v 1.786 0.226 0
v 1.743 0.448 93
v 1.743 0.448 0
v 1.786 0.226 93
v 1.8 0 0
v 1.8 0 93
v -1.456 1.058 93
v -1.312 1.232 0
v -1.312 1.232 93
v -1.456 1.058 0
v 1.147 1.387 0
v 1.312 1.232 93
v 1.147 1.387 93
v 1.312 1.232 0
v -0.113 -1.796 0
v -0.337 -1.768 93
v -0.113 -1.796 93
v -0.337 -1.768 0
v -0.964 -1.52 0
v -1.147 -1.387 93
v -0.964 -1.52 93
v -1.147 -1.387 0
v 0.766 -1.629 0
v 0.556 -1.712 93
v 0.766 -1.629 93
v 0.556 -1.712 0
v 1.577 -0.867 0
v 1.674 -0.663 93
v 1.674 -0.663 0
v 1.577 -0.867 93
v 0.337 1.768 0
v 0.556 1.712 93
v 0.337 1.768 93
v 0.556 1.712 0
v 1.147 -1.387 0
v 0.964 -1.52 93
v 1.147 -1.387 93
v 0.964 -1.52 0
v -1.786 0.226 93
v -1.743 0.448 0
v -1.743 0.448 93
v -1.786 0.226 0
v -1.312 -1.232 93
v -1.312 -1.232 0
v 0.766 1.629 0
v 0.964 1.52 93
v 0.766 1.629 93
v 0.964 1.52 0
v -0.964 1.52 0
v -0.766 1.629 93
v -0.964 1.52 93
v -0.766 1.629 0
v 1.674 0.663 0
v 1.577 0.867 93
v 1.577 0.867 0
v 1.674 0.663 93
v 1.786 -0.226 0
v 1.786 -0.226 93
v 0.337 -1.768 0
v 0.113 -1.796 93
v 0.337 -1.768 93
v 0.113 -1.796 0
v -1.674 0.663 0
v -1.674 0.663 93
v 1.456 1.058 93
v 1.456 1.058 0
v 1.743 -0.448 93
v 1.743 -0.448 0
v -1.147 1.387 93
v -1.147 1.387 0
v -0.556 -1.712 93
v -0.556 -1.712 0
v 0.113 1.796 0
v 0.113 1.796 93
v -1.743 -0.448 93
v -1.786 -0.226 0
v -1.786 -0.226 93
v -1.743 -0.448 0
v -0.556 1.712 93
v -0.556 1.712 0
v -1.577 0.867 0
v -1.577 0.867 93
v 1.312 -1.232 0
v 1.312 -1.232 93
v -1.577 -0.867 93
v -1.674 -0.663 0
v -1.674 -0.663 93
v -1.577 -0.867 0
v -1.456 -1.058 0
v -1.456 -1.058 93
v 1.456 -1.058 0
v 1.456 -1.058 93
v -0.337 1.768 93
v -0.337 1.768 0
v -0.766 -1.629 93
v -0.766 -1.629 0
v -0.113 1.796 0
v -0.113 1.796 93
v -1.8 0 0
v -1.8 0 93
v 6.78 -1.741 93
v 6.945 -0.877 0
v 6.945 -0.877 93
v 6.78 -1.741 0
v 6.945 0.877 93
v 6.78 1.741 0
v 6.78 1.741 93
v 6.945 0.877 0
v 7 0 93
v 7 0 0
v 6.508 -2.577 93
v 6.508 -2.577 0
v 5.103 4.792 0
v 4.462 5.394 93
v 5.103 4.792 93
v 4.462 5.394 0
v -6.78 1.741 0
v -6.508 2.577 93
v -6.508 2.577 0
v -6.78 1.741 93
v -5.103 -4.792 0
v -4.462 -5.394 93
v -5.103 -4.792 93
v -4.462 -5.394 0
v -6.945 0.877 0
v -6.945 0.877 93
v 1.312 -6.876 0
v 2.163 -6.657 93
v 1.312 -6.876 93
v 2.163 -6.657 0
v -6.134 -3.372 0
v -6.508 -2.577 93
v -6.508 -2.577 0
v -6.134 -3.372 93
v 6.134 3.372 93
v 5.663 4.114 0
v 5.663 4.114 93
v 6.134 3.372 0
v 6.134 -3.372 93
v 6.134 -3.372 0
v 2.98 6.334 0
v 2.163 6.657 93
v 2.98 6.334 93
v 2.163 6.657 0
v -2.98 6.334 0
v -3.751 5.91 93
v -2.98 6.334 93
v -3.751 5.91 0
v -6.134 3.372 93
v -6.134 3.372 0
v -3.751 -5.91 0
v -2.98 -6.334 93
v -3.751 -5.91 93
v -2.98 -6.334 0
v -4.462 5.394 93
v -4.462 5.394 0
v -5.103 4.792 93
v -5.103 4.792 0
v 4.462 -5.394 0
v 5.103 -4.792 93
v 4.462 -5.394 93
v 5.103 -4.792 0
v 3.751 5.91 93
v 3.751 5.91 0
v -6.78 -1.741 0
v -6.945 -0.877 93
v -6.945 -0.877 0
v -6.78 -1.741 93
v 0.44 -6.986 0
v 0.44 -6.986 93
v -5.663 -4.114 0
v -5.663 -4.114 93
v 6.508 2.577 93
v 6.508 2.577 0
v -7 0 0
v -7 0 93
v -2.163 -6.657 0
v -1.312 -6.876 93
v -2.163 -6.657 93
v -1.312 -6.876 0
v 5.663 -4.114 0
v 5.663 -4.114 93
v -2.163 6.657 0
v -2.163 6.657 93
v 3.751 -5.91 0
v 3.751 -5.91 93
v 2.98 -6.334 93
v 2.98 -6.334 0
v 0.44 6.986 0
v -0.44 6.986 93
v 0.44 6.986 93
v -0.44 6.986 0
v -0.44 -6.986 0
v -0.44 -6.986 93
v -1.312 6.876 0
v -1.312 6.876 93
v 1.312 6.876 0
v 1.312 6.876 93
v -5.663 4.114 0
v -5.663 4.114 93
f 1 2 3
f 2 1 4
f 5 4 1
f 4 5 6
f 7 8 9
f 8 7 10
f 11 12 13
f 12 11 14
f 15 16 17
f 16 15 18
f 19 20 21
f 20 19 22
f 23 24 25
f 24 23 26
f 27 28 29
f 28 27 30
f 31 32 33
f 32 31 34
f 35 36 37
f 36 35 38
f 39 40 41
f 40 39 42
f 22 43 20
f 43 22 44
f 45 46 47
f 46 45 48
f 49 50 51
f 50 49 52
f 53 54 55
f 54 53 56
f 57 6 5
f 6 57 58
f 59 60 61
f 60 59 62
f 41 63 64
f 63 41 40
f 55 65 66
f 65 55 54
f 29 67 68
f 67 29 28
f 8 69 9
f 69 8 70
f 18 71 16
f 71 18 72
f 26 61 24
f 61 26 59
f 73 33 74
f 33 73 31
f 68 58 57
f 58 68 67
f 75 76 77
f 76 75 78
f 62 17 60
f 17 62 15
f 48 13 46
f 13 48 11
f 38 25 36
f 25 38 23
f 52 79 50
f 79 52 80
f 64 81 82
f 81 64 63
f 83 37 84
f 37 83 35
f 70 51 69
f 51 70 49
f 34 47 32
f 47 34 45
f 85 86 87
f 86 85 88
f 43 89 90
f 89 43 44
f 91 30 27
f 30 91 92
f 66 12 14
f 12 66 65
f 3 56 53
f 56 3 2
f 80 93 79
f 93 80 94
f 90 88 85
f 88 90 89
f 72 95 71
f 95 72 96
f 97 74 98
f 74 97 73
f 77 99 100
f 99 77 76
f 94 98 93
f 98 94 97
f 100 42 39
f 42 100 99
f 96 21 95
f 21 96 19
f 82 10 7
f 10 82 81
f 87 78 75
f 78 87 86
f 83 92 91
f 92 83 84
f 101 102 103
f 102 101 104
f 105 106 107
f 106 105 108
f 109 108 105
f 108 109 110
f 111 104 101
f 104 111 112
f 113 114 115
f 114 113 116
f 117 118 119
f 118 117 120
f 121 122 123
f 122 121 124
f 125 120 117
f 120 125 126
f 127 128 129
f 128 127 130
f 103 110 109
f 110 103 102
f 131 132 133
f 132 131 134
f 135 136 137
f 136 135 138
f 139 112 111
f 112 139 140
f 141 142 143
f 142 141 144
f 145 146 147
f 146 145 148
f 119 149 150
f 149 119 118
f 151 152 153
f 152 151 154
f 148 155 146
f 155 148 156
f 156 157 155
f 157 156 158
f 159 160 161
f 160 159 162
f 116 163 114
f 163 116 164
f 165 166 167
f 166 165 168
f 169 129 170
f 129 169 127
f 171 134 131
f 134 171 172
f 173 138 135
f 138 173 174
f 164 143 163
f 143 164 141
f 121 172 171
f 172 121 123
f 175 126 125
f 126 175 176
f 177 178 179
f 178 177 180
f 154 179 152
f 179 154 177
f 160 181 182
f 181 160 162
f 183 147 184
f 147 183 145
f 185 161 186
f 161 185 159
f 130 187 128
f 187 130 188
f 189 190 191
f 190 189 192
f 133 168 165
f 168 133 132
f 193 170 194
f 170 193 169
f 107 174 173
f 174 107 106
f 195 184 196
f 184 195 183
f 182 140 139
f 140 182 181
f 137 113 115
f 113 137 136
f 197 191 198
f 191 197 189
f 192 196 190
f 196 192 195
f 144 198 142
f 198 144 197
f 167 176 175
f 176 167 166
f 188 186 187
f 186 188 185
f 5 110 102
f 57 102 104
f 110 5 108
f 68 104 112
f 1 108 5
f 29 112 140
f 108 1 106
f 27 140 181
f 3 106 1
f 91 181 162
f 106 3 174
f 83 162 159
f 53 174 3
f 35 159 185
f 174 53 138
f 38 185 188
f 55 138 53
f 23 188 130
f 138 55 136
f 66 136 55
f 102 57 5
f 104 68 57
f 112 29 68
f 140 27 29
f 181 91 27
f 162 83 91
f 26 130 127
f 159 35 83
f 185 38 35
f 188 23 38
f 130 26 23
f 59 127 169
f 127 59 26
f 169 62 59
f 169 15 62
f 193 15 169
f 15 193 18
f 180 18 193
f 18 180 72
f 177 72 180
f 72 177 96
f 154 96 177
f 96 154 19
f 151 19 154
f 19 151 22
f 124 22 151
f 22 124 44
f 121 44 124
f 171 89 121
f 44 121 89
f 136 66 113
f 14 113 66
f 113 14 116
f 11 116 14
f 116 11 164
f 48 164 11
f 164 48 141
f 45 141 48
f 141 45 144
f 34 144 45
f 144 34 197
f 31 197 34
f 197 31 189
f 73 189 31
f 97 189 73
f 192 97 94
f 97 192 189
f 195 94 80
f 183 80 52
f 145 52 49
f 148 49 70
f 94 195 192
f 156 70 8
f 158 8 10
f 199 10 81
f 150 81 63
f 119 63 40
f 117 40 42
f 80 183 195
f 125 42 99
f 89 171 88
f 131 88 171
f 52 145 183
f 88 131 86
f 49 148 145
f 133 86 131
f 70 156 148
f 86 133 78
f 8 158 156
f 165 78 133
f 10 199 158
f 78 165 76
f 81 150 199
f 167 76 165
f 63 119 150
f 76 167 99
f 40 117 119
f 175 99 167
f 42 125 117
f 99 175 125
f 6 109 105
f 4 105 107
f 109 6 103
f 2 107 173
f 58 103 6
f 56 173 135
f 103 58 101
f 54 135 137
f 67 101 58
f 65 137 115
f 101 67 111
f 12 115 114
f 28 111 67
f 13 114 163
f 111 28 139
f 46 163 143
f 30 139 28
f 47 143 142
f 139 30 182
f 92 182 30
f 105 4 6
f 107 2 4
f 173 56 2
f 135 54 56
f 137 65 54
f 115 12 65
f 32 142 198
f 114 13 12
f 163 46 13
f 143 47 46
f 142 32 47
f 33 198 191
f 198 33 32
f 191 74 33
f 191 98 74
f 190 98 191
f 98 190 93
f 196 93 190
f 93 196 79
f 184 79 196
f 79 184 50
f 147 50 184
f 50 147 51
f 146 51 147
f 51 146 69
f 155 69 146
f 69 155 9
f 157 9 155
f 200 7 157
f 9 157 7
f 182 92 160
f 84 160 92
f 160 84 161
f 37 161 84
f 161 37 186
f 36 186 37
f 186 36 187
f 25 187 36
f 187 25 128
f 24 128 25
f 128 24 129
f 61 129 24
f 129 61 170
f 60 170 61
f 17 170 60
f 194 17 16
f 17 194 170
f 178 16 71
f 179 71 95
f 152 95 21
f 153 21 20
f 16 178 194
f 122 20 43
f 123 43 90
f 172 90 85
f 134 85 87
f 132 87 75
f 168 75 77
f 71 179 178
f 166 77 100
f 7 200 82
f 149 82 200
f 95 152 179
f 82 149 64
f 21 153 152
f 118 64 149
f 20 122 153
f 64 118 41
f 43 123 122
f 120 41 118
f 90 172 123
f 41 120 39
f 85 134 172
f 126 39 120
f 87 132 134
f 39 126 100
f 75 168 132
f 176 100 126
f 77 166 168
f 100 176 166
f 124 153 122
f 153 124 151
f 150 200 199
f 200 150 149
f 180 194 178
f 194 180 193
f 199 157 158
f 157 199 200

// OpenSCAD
$fn = 50;


difference() {
	union() {
		cylinder(h = 93, r = 7.0000000000);
	}
	union() {
		translate(v = [0, 0, -100]) {
			cylinder(h = 200, r = 1.8000000000);
		}
		translate(v = [0, 0, -100]) {
			cylinder(h = 200, r = 1.8000000000);
		}
	}
}
